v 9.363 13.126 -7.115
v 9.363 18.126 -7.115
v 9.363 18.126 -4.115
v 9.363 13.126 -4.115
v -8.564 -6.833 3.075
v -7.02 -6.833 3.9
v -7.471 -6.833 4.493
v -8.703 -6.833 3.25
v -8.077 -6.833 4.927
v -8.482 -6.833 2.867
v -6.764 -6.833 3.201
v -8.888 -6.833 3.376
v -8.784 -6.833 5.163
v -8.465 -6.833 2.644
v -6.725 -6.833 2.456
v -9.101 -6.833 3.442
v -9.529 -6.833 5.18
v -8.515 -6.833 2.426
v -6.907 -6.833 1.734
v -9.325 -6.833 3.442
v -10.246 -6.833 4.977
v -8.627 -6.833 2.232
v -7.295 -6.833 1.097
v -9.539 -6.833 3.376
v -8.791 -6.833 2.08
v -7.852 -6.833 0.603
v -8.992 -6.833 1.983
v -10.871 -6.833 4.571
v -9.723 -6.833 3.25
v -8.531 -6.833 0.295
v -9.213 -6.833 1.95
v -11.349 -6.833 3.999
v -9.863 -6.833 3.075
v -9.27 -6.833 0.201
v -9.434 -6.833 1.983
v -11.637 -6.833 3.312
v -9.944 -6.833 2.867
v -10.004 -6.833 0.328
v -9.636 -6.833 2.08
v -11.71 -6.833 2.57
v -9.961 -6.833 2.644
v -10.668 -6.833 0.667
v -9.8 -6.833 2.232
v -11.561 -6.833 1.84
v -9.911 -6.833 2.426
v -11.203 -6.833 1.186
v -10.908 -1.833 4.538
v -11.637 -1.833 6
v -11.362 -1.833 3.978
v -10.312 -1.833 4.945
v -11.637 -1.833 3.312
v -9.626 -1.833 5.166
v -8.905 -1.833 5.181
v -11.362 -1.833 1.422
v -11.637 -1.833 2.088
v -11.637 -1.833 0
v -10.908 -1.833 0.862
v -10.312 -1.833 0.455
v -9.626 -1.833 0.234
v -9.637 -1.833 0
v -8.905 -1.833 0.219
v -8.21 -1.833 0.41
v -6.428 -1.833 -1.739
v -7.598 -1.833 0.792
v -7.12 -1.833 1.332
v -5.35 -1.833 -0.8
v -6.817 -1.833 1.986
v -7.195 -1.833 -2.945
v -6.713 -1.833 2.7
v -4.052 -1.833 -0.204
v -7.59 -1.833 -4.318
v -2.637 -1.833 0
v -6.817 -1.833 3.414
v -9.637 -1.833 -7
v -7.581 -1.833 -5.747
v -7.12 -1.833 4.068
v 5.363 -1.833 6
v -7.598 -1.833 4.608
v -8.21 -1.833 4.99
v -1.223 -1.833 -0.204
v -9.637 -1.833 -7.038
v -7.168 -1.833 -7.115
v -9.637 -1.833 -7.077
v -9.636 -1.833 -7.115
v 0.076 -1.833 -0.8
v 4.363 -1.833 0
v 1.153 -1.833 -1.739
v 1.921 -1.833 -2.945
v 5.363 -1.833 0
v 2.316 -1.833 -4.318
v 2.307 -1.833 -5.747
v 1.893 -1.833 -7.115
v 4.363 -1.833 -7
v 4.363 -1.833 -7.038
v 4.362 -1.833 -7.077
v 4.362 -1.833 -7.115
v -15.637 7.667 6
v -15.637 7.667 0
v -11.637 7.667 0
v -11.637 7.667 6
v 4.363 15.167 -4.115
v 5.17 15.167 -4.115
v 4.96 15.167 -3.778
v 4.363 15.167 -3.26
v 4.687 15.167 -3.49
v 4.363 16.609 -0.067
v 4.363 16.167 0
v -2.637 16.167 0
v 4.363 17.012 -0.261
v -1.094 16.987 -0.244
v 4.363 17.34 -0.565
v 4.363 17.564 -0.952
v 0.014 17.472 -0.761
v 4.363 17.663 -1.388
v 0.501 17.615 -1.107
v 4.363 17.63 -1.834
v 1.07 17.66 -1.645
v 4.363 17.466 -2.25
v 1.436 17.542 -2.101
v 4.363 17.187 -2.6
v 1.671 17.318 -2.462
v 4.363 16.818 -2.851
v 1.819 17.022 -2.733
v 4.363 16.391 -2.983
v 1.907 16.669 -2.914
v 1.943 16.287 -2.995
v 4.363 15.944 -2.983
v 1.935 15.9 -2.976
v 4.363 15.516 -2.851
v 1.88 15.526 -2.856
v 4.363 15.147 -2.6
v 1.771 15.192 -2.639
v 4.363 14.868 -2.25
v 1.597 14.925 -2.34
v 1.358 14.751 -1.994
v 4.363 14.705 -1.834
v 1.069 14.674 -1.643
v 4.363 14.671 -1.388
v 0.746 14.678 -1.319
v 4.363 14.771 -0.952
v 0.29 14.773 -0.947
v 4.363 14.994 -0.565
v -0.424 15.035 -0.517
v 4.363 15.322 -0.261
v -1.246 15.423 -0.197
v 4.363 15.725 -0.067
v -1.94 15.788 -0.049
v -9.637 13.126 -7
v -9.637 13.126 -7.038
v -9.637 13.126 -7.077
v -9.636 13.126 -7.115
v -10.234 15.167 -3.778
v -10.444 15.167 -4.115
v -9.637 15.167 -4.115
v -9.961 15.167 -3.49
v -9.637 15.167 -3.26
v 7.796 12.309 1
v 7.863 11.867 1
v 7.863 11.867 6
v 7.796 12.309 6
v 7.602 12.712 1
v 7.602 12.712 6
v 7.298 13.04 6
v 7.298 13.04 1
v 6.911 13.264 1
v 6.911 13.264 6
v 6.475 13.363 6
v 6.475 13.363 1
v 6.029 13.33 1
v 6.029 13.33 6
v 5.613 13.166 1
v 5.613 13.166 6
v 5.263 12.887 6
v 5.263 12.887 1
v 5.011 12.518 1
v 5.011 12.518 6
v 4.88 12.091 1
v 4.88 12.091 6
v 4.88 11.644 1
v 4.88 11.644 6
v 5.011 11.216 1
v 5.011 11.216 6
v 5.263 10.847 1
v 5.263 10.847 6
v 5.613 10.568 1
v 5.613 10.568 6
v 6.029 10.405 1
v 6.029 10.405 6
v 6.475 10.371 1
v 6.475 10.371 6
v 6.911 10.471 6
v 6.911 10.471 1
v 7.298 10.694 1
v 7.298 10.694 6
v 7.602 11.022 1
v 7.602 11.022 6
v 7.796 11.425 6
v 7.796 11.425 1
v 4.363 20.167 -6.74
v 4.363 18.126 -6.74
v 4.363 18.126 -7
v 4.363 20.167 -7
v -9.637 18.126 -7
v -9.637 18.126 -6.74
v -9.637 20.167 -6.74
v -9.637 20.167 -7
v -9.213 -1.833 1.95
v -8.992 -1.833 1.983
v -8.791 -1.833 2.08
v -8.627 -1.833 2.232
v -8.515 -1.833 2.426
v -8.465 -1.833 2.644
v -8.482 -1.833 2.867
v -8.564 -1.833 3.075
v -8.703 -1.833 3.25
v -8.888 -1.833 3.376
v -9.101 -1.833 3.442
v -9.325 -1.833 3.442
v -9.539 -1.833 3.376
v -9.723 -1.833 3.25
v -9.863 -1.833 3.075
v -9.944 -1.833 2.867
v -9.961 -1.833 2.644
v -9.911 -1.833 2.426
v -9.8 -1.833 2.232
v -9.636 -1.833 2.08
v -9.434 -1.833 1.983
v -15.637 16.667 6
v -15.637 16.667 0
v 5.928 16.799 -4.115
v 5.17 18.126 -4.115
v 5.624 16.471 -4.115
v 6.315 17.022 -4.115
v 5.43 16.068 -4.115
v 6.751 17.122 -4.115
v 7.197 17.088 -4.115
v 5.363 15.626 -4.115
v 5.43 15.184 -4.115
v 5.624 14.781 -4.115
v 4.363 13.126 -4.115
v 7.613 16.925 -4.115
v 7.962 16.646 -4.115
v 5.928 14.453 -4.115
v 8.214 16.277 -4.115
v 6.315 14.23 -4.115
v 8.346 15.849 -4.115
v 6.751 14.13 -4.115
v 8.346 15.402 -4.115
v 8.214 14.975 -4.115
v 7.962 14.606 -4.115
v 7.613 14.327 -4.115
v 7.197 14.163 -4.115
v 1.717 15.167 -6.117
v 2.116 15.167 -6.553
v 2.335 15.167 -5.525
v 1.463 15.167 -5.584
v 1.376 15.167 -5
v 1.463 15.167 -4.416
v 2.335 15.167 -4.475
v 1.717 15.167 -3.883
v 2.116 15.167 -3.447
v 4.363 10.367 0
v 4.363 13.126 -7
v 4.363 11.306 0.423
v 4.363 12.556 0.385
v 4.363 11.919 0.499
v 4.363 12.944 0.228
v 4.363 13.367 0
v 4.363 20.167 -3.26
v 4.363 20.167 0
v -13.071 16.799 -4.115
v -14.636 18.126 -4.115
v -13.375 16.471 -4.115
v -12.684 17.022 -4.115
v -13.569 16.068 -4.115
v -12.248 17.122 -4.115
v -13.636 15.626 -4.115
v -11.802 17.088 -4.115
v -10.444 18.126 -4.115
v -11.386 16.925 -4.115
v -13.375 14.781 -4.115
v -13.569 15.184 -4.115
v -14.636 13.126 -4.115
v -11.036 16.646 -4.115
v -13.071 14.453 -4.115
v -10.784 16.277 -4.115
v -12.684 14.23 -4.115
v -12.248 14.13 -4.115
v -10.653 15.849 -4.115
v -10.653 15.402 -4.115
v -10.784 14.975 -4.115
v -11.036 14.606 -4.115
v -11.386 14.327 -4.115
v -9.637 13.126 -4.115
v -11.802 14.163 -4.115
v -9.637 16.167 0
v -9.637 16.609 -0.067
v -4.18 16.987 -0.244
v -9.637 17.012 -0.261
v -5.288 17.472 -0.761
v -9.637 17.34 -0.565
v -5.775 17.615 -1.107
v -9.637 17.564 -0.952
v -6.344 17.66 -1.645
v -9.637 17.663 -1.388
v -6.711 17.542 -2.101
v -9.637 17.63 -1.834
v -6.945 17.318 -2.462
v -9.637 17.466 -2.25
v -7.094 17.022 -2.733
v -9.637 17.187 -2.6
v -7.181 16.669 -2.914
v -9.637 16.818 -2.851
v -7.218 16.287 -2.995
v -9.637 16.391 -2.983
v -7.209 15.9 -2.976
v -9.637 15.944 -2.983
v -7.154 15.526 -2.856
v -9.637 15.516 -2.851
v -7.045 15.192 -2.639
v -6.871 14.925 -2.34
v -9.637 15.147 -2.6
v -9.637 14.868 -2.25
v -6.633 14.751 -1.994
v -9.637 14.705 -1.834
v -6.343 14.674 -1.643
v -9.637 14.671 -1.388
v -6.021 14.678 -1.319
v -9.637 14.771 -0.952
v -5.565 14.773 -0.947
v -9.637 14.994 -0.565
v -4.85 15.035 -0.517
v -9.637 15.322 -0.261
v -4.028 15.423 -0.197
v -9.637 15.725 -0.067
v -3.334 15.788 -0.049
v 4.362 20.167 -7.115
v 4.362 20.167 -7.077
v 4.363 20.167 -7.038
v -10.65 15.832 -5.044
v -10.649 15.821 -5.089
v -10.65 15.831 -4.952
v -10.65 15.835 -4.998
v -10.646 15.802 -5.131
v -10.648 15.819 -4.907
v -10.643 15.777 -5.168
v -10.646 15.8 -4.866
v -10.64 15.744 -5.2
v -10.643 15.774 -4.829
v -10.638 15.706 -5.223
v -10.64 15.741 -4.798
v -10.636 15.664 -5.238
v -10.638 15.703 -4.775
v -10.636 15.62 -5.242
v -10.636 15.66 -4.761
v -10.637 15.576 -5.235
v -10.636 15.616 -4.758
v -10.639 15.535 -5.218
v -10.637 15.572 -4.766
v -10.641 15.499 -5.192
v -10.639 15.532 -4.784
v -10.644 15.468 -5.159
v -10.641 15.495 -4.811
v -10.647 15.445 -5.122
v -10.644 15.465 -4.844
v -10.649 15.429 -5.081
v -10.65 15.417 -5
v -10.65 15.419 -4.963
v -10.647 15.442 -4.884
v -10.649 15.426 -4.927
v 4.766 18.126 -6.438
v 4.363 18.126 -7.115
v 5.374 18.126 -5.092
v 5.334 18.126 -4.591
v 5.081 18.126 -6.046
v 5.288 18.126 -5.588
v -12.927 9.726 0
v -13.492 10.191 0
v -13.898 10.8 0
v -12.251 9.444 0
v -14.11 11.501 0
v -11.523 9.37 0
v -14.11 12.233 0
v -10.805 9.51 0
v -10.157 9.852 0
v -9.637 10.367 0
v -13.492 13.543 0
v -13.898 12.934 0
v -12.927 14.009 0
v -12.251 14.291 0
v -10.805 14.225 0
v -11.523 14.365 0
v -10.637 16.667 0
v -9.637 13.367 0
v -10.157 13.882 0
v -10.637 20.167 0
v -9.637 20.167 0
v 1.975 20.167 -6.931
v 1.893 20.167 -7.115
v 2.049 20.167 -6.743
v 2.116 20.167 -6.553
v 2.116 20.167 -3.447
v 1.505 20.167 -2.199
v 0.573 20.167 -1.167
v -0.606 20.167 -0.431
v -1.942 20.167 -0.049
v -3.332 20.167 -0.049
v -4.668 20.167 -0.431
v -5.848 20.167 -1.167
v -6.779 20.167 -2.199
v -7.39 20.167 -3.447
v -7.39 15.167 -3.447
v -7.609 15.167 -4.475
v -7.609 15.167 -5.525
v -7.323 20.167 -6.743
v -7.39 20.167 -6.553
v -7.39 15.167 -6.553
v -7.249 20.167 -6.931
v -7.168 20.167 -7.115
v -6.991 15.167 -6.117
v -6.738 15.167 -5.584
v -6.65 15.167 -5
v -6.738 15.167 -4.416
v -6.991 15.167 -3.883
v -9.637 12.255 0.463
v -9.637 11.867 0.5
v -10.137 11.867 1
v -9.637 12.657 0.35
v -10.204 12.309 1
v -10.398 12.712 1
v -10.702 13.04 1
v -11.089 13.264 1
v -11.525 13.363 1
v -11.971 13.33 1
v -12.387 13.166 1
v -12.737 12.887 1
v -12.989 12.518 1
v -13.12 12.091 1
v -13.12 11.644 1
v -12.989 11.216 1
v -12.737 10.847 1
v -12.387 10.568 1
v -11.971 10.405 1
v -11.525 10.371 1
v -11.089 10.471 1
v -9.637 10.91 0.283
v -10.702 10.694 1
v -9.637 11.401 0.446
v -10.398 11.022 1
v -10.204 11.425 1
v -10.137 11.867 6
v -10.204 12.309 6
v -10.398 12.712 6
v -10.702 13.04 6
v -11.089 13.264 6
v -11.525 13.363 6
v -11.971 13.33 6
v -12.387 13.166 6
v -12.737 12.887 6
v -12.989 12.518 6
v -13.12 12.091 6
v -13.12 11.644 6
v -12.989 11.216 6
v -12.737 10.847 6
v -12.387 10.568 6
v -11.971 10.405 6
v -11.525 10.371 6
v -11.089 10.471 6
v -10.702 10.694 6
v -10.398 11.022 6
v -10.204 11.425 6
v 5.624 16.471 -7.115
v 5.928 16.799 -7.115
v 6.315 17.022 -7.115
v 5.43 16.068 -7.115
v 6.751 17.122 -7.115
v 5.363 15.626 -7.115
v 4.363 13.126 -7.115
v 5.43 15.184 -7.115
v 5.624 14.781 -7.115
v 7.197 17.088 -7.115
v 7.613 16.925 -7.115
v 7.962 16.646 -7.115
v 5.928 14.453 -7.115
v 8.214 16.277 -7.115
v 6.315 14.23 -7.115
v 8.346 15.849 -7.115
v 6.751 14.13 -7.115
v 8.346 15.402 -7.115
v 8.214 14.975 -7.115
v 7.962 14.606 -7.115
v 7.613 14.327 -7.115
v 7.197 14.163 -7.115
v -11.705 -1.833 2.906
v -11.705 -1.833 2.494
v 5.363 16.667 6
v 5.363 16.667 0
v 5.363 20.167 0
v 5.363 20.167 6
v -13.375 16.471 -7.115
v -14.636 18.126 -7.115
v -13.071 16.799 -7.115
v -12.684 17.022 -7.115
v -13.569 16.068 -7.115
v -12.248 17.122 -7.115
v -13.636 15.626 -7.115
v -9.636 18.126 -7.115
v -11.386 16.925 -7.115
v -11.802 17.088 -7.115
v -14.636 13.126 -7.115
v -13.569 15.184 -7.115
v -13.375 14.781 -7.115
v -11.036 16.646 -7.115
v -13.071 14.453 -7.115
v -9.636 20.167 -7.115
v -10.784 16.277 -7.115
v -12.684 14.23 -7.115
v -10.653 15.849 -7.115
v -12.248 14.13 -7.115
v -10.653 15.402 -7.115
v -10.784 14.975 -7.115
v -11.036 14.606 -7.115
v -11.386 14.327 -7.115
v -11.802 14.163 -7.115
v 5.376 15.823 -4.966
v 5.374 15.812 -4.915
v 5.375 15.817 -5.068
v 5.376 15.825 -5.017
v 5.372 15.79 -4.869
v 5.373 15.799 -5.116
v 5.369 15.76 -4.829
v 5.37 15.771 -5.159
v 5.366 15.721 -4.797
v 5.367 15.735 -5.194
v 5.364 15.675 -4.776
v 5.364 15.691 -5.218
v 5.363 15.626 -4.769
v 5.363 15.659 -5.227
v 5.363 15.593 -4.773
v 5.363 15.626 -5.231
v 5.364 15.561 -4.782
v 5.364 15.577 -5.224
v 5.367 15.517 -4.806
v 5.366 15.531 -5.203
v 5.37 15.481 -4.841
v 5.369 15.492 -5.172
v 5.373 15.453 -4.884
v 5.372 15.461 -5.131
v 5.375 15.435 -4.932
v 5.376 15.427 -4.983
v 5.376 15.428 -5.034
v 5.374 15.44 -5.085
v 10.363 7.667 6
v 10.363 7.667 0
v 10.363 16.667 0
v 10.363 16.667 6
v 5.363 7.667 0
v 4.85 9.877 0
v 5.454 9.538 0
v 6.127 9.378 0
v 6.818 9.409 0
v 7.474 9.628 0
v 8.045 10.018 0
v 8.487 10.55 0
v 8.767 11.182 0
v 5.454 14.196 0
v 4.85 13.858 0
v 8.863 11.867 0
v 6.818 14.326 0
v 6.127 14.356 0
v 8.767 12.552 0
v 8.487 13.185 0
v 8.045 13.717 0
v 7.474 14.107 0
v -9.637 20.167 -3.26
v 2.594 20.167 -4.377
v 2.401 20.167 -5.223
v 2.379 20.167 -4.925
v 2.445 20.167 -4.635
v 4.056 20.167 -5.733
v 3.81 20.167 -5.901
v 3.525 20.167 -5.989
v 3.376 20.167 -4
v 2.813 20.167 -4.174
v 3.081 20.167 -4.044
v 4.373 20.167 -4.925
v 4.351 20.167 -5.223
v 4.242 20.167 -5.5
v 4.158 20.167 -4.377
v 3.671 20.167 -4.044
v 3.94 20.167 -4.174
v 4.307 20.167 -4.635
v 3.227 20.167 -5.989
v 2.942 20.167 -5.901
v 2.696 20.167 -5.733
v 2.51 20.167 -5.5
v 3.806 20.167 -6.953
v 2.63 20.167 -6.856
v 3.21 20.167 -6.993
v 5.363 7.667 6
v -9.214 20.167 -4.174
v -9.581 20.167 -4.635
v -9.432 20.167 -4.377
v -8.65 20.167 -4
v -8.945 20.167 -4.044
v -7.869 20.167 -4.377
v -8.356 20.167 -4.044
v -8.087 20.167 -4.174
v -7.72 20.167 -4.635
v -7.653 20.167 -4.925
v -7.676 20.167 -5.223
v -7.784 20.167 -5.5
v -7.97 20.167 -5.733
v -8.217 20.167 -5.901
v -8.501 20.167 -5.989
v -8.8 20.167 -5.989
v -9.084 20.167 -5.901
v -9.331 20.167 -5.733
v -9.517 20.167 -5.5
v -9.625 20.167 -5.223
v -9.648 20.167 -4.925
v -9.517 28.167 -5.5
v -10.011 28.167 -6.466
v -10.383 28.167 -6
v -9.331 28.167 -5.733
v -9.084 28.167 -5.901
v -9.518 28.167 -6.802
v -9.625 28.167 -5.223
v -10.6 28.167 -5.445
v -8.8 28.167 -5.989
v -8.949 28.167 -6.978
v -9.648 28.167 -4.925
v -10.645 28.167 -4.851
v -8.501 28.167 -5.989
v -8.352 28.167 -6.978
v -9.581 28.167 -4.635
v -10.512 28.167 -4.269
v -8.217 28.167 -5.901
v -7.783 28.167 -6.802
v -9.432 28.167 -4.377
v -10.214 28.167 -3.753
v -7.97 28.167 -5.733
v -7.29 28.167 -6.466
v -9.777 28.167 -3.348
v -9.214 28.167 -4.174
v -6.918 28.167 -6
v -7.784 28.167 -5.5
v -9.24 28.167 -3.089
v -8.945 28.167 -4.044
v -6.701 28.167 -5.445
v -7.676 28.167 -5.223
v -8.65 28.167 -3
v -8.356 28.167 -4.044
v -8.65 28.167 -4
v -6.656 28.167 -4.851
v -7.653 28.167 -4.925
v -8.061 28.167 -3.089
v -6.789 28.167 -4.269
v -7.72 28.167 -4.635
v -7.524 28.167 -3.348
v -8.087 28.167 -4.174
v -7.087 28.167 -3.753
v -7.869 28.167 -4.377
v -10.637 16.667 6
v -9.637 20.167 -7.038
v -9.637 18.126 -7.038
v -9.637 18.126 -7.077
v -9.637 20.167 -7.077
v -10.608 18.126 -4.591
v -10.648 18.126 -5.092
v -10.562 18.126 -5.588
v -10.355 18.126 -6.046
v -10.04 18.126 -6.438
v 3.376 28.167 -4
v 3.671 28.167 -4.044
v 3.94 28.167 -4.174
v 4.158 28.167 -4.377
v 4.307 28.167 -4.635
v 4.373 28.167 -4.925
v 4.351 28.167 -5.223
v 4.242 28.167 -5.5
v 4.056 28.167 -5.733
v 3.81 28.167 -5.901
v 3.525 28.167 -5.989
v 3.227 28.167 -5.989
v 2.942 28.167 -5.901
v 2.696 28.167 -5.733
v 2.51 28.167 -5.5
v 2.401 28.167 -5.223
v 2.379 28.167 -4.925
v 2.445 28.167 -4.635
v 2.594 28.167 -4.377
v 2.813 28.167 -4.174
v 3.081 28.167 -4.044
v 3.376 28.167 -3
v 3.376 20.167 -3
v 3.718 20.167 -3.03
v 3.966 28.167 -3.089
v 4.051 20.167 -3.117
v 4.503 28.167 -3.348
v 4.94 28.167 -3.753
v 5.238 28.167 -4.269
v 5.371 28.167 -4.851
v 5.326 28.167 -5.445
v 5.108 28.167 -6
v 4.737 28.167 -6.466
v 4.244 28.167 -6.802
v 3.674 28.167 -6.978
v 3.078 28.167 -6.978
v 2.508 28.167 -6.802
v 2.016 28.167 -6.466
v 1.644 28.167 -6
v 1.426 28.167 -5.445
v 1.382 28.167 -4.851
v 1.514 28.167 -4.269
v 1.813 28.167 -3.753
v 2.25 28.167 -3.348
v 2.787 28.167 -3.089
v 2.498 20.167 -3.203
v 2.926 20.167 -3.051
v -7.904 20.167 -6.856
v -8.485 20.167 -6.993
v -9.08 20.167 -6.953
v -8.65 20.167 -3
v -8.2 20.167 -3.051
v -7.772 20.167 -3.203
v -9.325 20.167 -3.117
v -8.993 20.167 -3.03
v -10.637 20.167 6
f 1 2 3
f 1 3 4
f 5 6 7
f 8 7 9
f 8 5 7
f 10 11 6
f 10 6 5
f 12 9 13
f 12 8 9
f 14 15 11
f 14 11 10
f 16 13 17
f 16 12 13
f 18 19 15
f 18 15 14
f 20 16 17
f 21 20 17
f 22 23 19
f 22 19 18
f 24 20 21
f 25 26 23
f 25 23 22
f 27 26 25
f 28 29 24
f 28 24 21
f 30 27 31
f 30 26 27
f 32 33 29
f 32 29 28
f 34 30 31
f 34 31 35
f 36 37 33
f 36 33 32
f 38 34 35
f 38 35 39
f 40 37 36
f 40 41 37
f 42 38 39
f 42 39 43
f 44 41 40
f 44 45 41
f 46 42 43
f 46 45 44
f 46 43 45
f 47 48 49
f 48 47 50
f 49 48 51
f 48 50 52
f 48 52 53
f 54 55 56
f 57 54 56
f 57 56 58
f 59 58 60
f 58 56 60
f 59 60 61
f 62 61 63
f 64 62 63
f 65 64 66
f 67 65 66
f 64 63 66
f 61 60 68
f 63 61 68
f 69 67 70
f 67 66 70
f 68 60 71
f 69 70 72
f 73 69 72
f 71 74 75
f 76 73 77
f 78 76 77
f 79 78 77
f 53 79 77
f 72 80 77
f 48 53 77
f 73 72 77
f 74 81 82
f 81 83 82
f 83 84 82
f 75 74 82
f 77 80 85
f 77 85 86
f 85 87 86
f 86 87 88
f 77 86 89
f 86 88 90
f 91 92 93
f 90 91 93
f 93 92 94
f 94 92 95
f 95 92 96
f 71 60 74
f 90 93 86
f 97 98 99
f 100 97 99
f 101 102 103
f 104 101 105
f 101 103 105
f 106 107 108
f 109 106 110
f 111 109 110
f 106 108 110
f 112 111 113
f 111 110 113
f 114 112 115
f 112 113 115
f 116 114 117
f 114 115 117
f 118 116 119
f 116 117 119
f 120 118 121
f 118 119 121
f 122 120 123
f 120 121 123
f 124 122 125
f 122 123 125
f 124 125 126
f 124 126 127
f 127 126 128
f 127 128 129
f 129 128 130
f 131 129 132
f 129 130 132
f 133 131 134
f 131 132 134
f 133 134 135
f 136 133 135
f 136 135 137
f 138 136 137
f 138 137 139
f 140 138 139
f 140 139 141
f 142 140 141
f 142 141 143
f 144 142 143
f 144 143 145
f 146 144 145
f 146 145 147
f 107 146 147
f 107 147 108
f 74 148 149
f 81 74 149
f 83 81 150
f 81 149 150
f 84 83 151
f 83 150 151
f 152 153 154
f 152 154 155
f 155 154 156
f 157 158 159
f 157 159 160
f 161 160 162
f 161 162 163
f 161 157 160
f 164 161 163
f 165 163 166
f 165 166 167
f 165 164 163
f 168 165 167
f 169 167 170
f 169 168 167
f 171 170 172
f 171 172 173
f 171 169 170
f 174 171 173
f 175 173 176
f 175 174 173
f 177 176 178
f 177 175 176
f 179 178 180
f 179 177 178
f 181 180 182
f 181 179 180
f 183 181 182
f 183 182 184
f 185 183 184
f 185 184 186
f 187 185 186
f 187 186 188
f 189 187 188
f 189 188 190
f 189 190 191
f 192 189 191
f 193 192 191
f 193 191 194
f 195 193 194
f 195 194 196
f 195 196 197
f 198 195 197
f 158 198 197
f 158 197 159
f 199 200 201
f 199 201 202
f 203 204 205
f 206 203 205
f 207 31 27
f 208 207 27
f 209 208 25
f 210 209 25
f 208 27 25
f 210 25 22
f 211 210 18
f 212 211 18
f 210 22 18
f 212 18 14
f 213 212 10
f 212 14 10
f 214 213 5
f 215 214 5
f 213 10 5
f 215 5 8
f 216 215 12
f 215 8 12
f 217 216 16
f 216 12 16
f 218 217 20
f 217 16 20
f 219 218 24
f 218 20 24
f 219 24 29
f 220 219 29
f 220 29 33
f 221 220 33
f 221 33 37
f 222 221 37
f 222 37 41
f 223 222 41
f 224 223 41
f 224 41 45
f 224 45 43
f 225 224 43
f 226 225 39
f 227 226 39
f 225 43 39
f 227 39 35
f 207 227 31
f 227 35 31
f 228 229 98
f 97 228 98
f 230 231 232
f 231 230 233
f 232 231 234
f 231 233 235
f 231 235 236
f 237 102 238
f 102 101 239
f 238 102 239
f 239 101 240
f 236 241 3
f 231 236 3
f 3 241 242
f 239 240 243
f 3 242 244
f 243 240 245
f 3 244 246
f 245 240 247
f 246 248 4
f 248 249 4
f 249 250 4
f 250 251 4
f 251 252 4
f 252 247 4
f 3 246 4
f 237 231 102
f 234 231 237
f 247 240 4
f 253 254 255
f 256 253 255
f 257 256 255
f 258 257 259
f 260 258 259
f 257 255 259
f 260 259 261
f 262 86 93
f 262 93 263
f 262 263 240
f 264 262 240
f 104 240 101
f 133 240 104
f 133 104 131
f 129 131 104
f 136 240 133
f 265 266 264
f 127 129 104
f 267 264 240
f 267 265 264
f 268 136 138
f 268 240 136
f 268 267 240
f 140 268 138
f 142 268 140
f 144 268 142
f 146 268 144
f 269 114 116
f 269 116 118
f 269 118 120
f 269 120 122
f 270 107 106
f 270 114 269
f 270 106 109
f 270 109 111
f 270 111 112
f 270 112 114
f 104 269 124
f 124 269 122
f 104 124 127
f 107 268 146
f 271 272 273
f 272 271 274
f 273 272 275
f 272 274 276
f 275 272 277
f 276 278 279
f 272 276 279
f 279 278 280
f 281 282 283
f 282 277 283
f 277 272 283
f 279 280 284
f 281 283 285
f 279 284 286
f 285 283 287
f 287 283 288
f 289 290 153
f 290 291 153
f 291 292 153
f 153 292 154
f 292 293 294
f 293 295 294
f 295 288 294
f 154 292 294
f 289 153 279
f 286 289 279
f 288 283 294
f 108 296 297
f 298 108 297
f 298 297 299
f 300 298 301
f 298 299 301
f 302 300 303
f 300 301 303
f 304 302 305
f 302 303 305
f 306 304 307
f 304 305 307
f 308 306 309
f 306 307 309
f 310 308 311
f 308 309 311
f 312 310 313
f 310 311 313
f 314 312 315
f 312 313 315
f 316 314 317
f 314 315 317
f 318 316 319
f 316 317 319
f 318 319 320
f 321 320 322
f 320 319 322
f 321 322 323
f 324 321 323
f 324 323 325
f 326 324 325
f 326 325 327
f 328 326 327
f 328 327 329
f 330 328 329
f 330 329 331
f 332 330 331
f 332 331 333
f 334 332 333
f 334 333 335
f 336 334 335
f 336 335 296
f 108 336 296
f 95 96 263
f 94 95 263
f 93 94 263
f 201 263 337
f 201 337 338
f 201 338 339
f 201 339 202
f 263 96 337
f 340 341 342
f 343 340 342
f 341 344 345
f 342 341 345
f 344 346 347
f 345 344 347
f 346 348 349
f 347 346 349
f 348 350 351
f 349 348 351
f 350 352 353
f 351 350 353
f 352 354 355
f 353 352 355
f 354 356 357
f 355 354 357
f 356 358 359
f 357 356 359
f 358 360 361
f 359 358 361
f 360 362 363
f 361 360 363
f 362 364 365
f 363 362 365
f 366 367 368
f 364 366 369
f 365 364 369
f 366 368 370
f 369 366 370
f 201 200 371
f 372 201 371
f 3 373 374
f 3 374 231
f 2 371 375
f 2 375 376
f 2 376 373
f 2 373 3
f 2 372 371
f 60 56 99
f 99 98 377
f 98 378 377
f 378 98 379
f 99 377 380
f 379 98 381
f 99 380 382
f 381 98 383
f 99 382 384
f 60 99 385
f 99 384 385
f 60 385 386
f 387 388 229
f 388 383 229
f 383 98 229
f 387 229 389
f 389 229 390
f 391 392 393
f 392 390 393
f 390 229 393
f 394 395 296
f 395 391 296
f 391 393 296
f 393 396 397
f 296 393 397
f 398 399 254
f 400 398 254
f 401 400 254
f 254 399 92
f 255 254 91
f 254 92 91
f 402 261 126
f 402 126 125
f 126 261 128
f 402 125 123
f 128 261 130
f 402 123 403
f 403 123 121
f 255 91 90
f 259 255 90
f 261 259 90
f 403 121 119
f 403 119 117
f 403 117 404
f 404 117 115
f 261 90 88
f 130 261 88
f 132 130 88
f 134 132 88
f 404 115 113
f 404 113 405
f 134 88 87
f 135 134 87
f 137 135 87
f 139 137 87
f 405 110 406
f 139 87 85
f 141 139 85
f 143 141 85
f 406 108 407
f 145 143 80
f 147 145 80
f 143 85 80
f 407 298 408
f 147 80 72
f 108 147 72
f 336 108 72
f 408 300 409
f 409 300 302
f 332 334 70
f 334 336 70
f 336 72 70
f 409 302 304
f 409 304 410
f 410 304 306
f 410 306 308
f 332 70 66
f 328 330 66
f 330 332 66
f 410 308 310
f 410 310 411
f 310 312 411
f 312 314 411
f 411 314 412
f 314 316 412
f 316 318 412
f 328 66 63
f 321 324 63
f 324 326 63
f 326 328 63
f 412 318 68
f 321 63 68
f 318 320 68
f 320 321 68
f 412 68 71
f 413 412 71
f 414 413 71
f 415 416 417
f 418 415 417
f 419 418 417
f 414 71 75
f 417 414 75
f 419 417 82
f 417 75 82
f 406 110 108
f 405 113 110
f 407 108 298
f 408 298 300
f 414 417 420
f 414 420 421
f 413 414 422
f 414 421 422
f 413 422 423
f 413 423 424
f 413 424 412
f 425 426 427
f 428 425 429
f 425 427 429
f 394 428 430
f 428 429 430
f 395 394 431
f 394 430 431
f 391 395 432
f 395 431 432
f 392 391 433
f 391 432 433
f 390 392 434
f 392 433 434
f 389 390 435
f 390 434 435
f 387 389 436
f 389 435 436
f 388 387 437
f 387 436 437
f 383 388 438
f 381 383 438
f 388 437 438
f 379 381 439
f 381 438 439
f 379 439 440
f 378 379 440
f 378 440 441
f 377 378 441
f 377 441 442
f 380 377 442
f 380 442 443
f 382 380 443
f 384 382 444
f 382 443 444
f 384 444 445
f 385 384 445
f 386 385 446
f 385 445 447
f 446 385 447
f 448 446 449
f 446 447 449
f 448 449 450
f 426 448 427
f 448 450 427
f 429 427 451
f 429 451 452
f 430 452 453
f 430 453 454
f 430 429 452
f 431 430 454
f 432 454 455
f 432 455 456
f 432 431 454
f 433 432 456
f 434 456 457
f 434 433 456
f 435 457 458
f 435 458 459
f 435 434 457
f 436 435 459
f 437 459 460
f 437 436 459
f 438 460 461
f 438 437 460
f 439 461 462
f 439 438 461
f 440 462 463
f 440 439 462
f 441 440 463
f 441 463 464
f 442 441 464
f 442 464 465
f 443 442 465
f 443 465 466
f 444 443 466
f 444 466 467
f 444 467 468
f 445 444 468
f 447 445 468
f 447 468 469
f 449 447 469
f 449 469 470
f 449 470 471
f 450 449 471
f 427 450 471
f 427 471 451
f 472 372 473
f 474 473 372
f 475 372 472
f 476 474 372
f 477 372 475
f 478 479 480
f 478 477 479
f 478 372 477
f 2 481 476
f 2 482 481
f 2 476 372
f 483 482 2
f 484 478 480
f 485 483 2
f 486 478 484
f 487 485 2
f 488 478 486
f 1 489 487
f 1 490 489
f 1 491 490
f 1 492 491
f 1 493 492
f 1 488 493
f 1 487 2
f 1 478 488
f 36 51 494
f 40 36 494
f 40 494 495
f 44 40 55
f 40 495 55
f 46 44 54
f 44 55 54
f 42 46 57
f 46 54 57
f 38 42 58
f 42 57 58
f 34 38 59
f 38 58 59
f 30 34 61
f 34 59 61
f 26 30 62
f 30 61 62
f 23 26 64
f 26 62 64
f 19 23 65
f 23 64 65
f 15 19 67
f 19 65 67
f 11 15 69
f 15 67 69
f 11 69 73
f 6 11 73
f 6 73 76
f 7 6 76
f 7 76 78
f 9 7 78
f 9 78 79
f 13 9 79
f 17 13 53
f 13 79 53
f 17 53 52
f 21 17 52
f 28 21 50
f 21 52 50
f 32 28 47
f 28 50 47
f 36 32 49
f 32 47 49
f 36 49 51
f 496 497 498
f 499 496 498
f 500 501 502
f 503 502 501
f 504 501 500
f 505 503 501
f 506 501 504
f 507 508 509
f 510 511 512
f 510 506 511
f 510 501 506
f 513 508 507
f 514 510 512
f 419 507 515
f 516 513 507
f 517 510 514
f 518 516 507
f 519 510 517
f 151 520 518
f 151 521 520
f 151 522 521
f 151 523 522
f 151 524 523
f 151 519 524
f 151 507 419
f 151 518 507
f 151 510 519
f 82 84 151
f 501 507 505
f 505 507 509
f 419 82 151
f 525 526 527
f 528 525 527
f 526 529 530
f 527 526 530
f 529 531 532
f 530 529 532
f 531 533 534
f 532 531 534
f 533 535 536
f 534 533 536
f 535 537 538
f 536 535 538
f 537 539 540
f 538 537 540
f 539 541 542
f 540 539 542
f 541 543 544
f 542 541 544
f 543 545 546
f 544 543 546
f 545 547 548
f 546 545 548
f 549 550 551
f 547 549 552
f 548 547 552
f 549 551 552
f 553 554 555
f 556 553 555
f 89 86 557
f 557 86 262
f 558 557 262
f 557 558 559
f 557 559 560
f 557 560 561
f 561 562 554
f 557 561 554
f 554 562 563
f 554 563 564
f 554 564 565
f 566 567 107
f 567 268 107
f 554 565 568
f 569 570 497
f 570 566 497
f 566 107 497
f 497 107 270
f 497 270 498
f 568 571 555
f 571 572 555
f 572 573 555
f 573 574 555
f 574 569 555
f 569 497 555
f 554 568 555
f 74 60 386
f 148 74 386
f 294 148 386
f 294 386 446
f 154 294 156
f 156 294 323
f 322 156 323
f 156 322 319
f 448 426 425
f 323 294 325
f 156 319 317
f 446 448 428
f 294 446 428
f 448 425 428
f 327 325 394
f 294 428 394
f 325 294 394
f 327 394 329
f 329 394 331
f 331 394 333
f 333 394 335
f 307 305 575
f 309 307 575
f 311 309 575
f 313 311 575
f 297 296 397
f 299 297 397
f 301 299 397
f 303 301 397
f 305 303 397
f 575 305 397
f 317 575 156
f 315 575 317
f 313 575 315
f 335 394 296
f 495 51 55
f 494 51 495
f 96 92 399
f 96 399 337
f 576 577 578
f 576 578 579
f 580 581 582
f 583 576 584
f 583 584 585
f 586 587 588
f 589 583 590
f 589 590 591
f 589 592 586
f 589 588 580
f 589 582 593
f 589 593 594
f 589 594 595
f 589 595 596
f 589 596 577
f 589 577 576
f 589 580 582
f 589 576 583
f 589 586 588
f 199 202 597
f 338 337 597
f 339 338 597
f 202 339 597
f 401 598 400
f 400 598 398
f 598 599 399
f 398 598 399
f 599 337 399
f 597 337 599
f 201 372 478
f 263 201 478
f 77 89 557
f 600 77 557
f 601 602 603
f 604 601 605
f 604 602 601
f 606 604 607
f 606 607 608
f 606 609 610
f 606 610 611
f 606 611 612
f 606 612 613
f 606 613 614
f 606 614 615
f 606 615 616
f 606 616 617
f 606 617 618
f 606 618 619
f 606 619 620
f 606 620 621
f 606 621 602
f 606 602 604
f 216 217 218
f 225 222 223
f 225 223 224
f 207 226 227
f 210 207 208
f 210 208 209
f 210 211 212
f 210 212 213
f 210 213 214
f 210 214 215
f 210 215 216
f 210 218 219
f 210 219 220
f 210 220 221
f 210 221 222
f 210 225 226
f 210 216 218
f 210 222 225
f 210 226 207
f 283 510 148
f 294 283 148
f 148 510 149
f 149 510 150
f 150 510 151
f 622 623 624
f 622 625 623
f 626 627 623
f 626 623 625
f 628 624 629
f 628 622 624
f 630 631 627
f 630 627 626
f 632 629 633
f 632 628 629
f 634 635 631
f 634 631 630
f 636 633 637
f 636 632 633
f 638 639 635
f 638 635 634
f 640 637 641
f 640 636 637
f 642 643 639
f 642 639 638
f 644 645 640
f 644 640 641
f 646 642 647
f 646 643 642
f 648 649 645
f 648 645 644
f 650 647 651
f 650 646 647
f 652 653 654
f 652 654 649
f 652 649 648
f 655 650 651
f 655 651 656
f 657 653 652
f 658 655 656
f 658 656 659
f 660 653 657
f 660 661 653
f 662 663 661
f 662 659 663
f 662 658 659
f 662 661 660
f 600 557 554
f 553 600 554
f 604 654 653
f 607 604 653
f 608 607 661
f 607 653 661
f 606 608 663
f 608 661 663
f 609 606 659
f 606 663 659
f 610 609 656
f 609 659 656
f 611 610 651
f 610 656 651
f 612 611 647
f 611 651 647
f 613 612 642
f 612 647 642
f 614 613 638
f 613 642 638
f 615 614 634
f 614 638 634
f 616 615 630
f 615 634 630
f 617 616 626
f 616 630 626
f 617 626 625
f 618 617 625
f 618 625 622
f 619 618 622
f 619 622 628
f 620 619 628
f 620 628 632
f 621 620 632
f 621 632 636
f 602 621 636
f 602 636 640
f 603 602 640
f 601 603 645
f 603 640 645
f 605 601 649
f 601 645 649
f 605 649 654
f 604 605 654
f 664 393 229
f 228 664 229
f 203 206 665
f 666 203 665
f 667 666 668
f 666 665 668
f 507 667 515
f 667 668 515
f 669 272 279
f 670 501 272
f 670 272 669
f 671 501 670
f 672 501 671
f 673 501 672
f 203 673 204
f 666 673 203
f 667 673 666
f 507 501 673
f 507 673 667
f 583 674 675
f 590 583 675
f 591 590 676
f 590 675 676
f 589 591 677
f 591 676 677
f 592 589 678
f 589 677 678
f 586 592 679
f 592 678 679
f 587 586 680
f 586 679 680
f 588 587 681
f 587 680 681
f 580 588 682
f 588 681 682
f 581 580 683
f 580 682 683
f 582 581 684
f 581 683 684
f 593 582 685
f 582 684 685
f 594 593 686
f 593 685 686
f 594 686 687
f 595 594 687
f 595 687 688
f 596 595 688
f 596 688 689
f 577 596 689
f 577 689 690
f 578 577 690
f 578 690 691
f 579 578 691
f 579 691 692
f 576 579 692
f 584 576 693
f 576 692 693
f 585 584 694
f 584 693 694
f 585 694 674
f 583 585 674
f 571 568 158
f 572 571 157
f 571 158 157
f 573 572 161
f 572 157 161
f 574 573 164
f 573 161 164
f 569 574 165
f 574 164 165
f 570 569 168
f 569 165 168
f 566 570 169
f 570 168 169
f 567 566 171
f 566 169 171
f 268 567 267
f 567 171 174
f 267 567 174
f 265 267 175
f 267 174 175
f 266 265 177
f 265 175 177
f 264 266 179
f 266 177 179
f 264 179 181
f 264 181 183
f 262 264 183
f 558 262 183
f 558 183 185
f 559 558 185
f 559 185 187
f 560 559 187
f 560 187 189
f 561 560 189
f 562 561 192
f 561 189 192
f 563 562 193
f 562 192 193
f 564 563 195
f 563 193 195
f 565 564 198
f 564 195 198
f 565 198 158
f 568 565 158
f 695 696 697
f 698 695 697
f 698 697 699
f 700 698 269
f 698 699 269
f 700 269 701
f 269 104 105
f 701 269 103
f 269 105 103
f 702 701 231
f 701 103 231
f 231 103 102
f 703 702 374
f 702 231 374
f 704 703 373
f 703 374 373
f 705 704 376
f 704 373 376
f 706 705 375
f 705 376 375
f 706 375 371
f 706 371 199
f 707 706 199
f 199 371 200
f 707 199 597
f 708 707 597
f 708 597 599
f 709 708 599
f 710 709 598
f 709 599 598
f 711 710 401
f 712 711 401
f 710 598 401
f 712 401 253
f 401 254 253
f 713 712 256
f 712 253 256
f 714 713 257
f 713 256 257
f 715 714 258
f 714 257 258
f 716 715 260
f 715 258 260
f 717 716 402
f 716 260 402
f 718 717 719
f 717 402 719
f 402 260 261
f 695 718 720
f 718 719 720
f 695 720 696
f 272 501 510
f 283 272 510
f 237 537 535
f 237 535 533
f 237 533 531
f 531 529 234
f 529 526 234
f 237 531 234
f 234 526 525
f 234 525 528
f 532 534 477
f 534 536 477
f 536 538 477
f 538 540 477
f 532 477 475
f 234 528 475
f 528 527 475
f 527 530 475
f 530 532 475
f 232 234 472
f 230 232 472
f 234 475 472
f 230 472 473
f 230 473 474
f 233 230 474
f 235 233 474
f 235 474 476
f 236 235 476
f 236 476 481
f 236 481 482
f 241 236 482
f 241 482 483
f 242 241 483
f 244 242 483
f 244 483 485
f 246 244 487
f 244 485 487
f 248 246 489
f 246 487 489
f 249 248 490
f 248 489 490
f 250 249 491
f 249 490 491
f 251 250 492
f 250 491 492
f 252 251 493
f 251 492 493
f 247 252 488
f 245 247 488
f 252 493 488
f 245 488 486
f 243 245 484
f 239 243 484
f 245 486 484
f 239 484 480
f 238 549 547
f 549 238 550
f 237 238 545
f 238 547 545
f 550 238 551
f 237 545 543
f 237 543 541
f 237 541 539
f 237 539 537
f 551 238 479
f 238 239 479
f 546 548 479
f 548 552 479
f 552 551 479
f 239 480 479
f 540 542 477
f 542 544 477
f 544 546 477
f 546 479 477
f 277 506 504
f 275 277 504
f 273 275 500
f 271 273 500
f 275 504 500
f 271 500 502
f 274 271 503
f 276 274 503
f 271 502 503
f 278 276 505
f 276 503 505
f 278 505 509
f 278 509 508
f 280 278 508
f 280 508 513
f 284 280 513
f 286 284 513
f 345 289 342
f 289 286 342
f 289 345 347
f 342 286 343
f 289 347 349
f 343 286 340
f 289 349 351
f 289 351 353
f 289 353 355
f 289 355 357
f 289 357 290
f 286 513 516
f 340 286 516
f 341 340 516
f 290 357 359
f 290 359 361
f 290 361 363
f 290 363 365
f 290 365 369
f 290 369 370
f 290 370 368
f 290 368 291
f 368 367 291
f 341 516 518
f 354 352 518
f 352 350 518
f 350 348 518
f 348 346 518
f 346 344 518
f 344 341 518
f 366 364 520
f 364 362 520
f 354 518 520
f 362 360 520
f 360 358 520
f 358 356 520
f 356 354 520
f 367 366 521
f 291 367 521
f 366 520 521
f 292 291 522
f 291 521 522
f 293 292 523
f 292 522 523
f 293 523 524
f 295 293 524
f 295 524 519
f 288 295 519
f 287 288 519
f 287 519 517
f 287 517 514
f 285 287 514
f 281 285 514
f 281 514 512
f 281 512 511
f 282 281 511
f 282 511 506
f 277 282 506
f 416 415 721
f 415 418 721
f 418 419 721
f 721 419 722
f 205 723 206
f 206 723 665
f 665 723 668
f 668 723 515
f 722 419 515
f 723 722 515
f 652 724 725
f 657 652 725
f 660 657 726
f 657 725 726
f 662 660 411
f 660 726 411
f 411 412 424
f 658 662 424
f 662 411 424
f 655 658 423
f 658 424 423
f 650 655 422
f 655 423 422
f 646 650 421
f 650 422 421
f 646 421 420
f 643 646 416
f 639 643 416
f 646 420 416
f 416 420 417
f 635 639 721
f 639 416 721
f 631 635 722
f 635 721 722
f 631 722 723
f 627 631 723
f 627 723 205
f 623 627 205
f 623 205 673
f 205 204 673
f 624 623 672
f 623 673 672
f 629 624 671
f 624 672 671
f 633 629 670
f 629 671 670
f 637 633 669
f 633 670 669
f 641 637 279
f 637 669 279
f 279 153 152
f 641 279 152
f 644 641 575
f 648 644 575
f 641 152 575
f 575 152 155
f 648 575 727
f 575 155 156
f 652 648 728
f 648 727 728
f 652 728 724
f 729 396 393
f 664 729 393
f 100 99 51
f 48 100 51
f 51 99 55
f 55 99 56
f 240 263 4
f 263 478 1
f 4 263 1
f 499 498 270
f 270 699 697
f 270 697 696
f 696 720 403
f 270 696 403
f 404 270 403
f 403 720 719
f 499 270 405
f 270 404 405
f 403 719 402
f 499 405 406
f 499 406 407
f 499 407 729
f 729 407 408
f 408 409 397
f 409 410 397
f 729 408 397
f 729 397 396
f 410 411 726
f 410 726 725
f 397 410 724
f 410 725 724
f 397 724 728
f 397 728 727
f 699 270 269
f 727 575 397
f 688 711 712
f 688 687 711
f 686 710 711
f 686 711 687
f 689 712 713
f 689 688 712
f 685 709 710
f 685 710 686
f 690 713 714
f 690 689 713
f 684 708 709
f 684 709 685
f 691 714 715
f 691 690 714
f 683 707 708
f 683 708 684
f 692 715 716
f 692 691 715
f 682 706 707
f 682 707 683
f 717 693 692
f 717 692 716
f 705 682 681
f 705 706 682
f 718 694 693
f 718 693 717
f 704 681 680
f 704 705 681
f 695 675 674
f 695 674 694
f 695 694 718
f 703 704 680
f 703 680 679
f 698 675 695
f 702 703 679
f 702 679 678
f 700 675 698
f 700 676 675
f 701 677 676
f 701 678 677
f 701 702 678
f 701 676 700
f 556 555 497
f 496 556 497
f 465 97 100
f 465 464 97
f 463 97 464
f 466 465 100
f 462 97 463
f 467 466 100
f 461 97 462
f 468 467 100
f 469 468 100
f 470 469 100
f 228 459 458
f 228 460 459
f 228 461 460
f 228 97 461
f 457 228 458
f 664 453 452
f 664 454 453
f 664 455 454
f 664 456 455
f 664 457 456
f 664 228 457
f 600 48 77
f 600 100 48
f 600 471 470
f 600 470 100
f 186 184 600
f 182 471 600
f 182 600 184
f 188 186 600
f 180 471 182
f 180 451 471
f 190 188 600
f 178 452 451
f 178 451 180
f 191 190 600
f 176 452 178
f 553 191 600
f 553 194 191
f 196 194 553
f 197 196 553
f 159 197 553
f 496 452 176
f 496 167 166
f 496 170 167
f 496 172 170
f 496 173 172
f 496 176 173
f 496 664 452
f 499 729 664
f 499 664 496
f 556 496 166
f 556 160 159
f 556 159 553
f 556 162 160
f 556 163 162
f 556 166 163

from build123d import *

# Parameters (mm, degrees)
ESBO_O1_R                      = 1.5
RESSALTO_EXTRUS_O1_DEPTH       = 6
ESBO_O6_W                      = 14
ESBO_O6_H                      = 22
RESSALTO_EXTRUS_O3_DEPTH       = 12
ESBO_O7_R                      = 5
CORTE_EXTRUS_O4_DEPTH          = 30.538450843
FILETE3_R                      = 5
RESSALTO_EXTRUS_O13_DEPTH      = 8
RESSALTO_EXTRUS_O13_DEPTH_BACK = 5
ESBO_O15_R                     = 2
ESBO_O17_R                     = 1
CORTE_EXTRUS_O6_DEPTH          = 8
ESBO_O21_W                     = 22.669500521
ESBO_O21_H                     = 31.157259519
CORTE_EXTRUS_O8_DEPTH          = 6
ESBO_O22_W                     = 5
ESBO_O22_H                     = 5
ESBO_O22_R                     = 1.5
RESSALTO_EXTRUS_O15_DEPTH      = 3
ESBO_O23_R                     = 2.5
RESSALTO_EXTRUS_O16_DEPTH      = 5
ESBO_O24_R                     = 0.75
CORTE_EXTRUS_O9_DEPTH          = 5
CHANFRO5_SIZE                  = 1
ESBO_O25_R                     = 1.5
CORTE_EXTRUS_O11_DEPTH         = 14


with BuildPart() as part:
    # Esboço1 → Ressalto-extrusão1 (new body)
    with BuildSketch(Plane.XY):
        Polygon((-11.637137788, -1.832768542), (5.362862212, -1.832768542), (5.362862212, 7.667231458), (10.362862212, 7.667231458), (10.362862212, 16.667231458), (5.362862212, 16.667231458), (5.362862212, 20.167231458), (-10.637137788, 20.167231458), (-10.637137788, 16.667231458), (-15.637137788, 16.667231458), (-15.637137788, 7.667231458), (-11.637137788, 7.667231458), align=None)
        with Locations((6.362862212, 11.867231458)):
            Circle(ESBO_O1_R, mode=Mode.SUBTRACT)
        with Locations((-11.637137788, 11.867231458)):
            Circle(ESBO_O1_R, mode=Mode.SUBTRACT)
    extrude(amount=RESSALTO_EXTRUS_O1_DEPTH)

    # Esboço6 → Ressalto-extrusão3 (add)
    with BuildSketch(Plane(origin=(0, 0, 0), x_dir=(-1, 0, 0), z_dir=(0, 0, -1))):
        with Locations((2.637137788, 9.167231458)):
            Rectangle(ESBO_O6_W, ESBO_O6_H)
    extrude(amount=RESSALTO_EXTRUS_O3_DEPTH)

    # Esboço7 → Corte-extrusão4 (cut, through all)
    with BuildSketch(Plane.XZ.offset(1.832768542)):
        with Locations(Location((-2.637137788, -5, 0), (0, 0, 270))):
            Circle(ESBO_O7_R)
    extrude(amount=-CORTE_EXTRUS_O4_DEPTH, mode=Mode.SUBTRACT)

    # Filete3
    filete3_edges = [part.edges().sort_by_distance(p)[0] for p in [
        (4.362862212, 9.167231458, -12),
        (-9.637137788, 9.167231458, -12),
    ]]
    fillet(filete3_edges, radius=FILETE3_R)

    # Esboço15 → Ressalto-extrusão13 (add, two sides: drawn at the far end of the back side and taken through both)
    with BuildSketch(Plane(origin=(0, 20.167231458, 0), x_dir=(1, 0, 0), z_dir=(0, 1, 0)).offset(-RESSALTO_EXTRUS_O13_DEPTH_BACK)):
        with Locations(Location((-8.650480796, 5, 0), (0, 0, 270))):
            Circle(ESBO_O15_R)
        with Locations(Location((3.376205221, 5, 0), (0, 0, 270))):
            Circle(ESBO_O15_R)
    extrude(amount=RESSALTO_EXTRUS_O13_DEPTH + RESSALTO_EXTRUS_O13_DEPTH_BACK)

    # Esboço17 → Corte-extrusão6 (cut)
    with BuildSketch(Plane(origin=(0, 28.167231458, 0), x_dir=(1, 0, 0), z_dir=(0, 1, 0))):
        with Locations(Location((-8.650480796, 5, 0), (0, 0, 270))):
            Circle(ESBO_O17_R)
        with Locations(Location((3.376205221, 5, 0), (0, 0, 270))):
            Circle(ESBO_O17_R)
    extrude(amount=-CORTE_EXTRUS_O6_DEPTH, mode=Mode.SUBTRACT)

    # Esboço21 → Corte-extrusão8 (cut)
    with BuildSketch(Plane(origin=(0, 0, -7.115225733), x_dir=(1, 0, 0), z_dir=(0, 0, -1))):
        with Locations((-2.778124877, -9.864448806)):
            Rectangle(ESBO_O21_W, ESBO_O21_H)
    extrude(amount=CORTE_EXTRUS_O8_DEPTH, mode=Mode.SUBTRACT)

    # Esboço22 → Ressalto-extrusão15 (add)
    # profile 1 of 2: a face of its own
    with BuildSketch(Plane(origin=(0, 0, -7.115225733), x_dir=(1, 0, 0), z_dir=(0, 0, -1))):
        with Locations((-12.135809914, -15.625880271)):
            Rectangle(ESBO_O22_W, ESBO_O22_H)
        with Locations(Location((-12.135809914, -15.625880271, 0), (0, 0, 180))):
            Circle(ESBO_O22_R, mode=Mode.SUBTRACT)
    # profile 2 of 2: a face of its own
    with BuildSketch(Plane(origin=(0, 0, -7.115225733), x_dir=(1, 0, 0), z_dir=(0, 0, -1))):
        with Locations((6.862862212, -15.625880271)):
            Rectangle(ESBO_O22_W, ESBO_O22_H)
        with Locations(Location((6.862862212, -15.625880271, 0), (0, 0, 180))):
            Circle(ESBO_O22_R, mode=Mode.SUBTRACT)
    extrude(amount=-RESSALTO_EXTRUS_O15_DEPTH)

    # Esboço23 → Ressalto-extrusão16 (add)
    with BuildSketch(Plane.XZ.offset(1.832768542)):
        with Locations(Location((-9.213137788, 2.7, 0), (0, 0, 165.836166317))):
            Circle(ESBO_O23_R)
    extrude(amount=RESSALTO_EXTRUS_O16_DEPTH)

    # Esboço24 → Corte-extrusão9 (cut)
    with BuildSketch(Plane.XZ.offset(6.832768542)):
        with Locations(Location((-9.213137788, 2.7, 0), (0, 0, 270))):
            Circle(ESBO_O24_R)
    extrude(amount=-CORTE_EXTRUS_O9_DEPTH, mode=Mode.SUBTRACT)

    # Chanfro5
    # the kernel refuses this chamfer: 1 mm, written as the material it takes off along each edge
    with BuildSketch(Plane(origin=(6.362862212, 11.867231458, 0), x_dir=(1, 0, 0), z_dir=(0, -1, 0))) as chanfro5_piece_1_section:
        Polygon((1.5 + CHANFRO5_SIZE, 0), (1.5, CHANFRO5_SIZE), (1.5, 0), align=None)
    chanfro5_piece_1 = revolve(axis=Axis((6.362862212, 11.867231458, 0), (0, 0, 1)), mode=Mode.PRIVATE)
    chanfro5_piece_1 = split(chanfro5_piece_1, bisect_by=Plane(origin=(4.362862212, 13.893105183, 0.134898453), z_dir=(1, 0, 0)), keep=Keep.TOP, mode=Mode.PRIVATE)
    add(chanfro5_piece_1, mode=Mode.SUBTRACT)
    with BuildSketch(Plane(origin=(-11.637137788, 11.867231458, 0), x_dir=(1, 0, 0), z_dir=(0, -1, 0))) as chanfro5_piece_2_section:
        Polygon((1.5 + CHANFRO5_SIZE, 0), (1.5, CHANFRO5_SIZE), (1.5, 0), align=None)
    chanfro5_piece_2 = revolve(axis=Axis((-11.637137788, 11.867231458, 0), (0, 0, 1)), mode=Mode.PRIVATE)
    chanfro5_piece_2 = split(chanfro5_piece_2, bisect_by=Plane(origin=(-9.637137788, 11.867231458, 0.487087965), z_dir=(-1, 0, 0)), keep=Keep.TOP, mode=Mode.PRIVATE)
    add(chanfro5_piece_2, mode=Mode.SUBTRACT)

    # Esboço25 → Corte-extrusão11 (cut)
    with BuildSketch(Plane.ZY.offset(9.637137788)):
        with Locations((-1.5, 16.167231458)):
            Circle(ESBO_O25_R)
    extrude(amount=-CORTE_EXTRUS_O11_DEPTH, mode=Mode.SUBTRACT)


solid = part.part
